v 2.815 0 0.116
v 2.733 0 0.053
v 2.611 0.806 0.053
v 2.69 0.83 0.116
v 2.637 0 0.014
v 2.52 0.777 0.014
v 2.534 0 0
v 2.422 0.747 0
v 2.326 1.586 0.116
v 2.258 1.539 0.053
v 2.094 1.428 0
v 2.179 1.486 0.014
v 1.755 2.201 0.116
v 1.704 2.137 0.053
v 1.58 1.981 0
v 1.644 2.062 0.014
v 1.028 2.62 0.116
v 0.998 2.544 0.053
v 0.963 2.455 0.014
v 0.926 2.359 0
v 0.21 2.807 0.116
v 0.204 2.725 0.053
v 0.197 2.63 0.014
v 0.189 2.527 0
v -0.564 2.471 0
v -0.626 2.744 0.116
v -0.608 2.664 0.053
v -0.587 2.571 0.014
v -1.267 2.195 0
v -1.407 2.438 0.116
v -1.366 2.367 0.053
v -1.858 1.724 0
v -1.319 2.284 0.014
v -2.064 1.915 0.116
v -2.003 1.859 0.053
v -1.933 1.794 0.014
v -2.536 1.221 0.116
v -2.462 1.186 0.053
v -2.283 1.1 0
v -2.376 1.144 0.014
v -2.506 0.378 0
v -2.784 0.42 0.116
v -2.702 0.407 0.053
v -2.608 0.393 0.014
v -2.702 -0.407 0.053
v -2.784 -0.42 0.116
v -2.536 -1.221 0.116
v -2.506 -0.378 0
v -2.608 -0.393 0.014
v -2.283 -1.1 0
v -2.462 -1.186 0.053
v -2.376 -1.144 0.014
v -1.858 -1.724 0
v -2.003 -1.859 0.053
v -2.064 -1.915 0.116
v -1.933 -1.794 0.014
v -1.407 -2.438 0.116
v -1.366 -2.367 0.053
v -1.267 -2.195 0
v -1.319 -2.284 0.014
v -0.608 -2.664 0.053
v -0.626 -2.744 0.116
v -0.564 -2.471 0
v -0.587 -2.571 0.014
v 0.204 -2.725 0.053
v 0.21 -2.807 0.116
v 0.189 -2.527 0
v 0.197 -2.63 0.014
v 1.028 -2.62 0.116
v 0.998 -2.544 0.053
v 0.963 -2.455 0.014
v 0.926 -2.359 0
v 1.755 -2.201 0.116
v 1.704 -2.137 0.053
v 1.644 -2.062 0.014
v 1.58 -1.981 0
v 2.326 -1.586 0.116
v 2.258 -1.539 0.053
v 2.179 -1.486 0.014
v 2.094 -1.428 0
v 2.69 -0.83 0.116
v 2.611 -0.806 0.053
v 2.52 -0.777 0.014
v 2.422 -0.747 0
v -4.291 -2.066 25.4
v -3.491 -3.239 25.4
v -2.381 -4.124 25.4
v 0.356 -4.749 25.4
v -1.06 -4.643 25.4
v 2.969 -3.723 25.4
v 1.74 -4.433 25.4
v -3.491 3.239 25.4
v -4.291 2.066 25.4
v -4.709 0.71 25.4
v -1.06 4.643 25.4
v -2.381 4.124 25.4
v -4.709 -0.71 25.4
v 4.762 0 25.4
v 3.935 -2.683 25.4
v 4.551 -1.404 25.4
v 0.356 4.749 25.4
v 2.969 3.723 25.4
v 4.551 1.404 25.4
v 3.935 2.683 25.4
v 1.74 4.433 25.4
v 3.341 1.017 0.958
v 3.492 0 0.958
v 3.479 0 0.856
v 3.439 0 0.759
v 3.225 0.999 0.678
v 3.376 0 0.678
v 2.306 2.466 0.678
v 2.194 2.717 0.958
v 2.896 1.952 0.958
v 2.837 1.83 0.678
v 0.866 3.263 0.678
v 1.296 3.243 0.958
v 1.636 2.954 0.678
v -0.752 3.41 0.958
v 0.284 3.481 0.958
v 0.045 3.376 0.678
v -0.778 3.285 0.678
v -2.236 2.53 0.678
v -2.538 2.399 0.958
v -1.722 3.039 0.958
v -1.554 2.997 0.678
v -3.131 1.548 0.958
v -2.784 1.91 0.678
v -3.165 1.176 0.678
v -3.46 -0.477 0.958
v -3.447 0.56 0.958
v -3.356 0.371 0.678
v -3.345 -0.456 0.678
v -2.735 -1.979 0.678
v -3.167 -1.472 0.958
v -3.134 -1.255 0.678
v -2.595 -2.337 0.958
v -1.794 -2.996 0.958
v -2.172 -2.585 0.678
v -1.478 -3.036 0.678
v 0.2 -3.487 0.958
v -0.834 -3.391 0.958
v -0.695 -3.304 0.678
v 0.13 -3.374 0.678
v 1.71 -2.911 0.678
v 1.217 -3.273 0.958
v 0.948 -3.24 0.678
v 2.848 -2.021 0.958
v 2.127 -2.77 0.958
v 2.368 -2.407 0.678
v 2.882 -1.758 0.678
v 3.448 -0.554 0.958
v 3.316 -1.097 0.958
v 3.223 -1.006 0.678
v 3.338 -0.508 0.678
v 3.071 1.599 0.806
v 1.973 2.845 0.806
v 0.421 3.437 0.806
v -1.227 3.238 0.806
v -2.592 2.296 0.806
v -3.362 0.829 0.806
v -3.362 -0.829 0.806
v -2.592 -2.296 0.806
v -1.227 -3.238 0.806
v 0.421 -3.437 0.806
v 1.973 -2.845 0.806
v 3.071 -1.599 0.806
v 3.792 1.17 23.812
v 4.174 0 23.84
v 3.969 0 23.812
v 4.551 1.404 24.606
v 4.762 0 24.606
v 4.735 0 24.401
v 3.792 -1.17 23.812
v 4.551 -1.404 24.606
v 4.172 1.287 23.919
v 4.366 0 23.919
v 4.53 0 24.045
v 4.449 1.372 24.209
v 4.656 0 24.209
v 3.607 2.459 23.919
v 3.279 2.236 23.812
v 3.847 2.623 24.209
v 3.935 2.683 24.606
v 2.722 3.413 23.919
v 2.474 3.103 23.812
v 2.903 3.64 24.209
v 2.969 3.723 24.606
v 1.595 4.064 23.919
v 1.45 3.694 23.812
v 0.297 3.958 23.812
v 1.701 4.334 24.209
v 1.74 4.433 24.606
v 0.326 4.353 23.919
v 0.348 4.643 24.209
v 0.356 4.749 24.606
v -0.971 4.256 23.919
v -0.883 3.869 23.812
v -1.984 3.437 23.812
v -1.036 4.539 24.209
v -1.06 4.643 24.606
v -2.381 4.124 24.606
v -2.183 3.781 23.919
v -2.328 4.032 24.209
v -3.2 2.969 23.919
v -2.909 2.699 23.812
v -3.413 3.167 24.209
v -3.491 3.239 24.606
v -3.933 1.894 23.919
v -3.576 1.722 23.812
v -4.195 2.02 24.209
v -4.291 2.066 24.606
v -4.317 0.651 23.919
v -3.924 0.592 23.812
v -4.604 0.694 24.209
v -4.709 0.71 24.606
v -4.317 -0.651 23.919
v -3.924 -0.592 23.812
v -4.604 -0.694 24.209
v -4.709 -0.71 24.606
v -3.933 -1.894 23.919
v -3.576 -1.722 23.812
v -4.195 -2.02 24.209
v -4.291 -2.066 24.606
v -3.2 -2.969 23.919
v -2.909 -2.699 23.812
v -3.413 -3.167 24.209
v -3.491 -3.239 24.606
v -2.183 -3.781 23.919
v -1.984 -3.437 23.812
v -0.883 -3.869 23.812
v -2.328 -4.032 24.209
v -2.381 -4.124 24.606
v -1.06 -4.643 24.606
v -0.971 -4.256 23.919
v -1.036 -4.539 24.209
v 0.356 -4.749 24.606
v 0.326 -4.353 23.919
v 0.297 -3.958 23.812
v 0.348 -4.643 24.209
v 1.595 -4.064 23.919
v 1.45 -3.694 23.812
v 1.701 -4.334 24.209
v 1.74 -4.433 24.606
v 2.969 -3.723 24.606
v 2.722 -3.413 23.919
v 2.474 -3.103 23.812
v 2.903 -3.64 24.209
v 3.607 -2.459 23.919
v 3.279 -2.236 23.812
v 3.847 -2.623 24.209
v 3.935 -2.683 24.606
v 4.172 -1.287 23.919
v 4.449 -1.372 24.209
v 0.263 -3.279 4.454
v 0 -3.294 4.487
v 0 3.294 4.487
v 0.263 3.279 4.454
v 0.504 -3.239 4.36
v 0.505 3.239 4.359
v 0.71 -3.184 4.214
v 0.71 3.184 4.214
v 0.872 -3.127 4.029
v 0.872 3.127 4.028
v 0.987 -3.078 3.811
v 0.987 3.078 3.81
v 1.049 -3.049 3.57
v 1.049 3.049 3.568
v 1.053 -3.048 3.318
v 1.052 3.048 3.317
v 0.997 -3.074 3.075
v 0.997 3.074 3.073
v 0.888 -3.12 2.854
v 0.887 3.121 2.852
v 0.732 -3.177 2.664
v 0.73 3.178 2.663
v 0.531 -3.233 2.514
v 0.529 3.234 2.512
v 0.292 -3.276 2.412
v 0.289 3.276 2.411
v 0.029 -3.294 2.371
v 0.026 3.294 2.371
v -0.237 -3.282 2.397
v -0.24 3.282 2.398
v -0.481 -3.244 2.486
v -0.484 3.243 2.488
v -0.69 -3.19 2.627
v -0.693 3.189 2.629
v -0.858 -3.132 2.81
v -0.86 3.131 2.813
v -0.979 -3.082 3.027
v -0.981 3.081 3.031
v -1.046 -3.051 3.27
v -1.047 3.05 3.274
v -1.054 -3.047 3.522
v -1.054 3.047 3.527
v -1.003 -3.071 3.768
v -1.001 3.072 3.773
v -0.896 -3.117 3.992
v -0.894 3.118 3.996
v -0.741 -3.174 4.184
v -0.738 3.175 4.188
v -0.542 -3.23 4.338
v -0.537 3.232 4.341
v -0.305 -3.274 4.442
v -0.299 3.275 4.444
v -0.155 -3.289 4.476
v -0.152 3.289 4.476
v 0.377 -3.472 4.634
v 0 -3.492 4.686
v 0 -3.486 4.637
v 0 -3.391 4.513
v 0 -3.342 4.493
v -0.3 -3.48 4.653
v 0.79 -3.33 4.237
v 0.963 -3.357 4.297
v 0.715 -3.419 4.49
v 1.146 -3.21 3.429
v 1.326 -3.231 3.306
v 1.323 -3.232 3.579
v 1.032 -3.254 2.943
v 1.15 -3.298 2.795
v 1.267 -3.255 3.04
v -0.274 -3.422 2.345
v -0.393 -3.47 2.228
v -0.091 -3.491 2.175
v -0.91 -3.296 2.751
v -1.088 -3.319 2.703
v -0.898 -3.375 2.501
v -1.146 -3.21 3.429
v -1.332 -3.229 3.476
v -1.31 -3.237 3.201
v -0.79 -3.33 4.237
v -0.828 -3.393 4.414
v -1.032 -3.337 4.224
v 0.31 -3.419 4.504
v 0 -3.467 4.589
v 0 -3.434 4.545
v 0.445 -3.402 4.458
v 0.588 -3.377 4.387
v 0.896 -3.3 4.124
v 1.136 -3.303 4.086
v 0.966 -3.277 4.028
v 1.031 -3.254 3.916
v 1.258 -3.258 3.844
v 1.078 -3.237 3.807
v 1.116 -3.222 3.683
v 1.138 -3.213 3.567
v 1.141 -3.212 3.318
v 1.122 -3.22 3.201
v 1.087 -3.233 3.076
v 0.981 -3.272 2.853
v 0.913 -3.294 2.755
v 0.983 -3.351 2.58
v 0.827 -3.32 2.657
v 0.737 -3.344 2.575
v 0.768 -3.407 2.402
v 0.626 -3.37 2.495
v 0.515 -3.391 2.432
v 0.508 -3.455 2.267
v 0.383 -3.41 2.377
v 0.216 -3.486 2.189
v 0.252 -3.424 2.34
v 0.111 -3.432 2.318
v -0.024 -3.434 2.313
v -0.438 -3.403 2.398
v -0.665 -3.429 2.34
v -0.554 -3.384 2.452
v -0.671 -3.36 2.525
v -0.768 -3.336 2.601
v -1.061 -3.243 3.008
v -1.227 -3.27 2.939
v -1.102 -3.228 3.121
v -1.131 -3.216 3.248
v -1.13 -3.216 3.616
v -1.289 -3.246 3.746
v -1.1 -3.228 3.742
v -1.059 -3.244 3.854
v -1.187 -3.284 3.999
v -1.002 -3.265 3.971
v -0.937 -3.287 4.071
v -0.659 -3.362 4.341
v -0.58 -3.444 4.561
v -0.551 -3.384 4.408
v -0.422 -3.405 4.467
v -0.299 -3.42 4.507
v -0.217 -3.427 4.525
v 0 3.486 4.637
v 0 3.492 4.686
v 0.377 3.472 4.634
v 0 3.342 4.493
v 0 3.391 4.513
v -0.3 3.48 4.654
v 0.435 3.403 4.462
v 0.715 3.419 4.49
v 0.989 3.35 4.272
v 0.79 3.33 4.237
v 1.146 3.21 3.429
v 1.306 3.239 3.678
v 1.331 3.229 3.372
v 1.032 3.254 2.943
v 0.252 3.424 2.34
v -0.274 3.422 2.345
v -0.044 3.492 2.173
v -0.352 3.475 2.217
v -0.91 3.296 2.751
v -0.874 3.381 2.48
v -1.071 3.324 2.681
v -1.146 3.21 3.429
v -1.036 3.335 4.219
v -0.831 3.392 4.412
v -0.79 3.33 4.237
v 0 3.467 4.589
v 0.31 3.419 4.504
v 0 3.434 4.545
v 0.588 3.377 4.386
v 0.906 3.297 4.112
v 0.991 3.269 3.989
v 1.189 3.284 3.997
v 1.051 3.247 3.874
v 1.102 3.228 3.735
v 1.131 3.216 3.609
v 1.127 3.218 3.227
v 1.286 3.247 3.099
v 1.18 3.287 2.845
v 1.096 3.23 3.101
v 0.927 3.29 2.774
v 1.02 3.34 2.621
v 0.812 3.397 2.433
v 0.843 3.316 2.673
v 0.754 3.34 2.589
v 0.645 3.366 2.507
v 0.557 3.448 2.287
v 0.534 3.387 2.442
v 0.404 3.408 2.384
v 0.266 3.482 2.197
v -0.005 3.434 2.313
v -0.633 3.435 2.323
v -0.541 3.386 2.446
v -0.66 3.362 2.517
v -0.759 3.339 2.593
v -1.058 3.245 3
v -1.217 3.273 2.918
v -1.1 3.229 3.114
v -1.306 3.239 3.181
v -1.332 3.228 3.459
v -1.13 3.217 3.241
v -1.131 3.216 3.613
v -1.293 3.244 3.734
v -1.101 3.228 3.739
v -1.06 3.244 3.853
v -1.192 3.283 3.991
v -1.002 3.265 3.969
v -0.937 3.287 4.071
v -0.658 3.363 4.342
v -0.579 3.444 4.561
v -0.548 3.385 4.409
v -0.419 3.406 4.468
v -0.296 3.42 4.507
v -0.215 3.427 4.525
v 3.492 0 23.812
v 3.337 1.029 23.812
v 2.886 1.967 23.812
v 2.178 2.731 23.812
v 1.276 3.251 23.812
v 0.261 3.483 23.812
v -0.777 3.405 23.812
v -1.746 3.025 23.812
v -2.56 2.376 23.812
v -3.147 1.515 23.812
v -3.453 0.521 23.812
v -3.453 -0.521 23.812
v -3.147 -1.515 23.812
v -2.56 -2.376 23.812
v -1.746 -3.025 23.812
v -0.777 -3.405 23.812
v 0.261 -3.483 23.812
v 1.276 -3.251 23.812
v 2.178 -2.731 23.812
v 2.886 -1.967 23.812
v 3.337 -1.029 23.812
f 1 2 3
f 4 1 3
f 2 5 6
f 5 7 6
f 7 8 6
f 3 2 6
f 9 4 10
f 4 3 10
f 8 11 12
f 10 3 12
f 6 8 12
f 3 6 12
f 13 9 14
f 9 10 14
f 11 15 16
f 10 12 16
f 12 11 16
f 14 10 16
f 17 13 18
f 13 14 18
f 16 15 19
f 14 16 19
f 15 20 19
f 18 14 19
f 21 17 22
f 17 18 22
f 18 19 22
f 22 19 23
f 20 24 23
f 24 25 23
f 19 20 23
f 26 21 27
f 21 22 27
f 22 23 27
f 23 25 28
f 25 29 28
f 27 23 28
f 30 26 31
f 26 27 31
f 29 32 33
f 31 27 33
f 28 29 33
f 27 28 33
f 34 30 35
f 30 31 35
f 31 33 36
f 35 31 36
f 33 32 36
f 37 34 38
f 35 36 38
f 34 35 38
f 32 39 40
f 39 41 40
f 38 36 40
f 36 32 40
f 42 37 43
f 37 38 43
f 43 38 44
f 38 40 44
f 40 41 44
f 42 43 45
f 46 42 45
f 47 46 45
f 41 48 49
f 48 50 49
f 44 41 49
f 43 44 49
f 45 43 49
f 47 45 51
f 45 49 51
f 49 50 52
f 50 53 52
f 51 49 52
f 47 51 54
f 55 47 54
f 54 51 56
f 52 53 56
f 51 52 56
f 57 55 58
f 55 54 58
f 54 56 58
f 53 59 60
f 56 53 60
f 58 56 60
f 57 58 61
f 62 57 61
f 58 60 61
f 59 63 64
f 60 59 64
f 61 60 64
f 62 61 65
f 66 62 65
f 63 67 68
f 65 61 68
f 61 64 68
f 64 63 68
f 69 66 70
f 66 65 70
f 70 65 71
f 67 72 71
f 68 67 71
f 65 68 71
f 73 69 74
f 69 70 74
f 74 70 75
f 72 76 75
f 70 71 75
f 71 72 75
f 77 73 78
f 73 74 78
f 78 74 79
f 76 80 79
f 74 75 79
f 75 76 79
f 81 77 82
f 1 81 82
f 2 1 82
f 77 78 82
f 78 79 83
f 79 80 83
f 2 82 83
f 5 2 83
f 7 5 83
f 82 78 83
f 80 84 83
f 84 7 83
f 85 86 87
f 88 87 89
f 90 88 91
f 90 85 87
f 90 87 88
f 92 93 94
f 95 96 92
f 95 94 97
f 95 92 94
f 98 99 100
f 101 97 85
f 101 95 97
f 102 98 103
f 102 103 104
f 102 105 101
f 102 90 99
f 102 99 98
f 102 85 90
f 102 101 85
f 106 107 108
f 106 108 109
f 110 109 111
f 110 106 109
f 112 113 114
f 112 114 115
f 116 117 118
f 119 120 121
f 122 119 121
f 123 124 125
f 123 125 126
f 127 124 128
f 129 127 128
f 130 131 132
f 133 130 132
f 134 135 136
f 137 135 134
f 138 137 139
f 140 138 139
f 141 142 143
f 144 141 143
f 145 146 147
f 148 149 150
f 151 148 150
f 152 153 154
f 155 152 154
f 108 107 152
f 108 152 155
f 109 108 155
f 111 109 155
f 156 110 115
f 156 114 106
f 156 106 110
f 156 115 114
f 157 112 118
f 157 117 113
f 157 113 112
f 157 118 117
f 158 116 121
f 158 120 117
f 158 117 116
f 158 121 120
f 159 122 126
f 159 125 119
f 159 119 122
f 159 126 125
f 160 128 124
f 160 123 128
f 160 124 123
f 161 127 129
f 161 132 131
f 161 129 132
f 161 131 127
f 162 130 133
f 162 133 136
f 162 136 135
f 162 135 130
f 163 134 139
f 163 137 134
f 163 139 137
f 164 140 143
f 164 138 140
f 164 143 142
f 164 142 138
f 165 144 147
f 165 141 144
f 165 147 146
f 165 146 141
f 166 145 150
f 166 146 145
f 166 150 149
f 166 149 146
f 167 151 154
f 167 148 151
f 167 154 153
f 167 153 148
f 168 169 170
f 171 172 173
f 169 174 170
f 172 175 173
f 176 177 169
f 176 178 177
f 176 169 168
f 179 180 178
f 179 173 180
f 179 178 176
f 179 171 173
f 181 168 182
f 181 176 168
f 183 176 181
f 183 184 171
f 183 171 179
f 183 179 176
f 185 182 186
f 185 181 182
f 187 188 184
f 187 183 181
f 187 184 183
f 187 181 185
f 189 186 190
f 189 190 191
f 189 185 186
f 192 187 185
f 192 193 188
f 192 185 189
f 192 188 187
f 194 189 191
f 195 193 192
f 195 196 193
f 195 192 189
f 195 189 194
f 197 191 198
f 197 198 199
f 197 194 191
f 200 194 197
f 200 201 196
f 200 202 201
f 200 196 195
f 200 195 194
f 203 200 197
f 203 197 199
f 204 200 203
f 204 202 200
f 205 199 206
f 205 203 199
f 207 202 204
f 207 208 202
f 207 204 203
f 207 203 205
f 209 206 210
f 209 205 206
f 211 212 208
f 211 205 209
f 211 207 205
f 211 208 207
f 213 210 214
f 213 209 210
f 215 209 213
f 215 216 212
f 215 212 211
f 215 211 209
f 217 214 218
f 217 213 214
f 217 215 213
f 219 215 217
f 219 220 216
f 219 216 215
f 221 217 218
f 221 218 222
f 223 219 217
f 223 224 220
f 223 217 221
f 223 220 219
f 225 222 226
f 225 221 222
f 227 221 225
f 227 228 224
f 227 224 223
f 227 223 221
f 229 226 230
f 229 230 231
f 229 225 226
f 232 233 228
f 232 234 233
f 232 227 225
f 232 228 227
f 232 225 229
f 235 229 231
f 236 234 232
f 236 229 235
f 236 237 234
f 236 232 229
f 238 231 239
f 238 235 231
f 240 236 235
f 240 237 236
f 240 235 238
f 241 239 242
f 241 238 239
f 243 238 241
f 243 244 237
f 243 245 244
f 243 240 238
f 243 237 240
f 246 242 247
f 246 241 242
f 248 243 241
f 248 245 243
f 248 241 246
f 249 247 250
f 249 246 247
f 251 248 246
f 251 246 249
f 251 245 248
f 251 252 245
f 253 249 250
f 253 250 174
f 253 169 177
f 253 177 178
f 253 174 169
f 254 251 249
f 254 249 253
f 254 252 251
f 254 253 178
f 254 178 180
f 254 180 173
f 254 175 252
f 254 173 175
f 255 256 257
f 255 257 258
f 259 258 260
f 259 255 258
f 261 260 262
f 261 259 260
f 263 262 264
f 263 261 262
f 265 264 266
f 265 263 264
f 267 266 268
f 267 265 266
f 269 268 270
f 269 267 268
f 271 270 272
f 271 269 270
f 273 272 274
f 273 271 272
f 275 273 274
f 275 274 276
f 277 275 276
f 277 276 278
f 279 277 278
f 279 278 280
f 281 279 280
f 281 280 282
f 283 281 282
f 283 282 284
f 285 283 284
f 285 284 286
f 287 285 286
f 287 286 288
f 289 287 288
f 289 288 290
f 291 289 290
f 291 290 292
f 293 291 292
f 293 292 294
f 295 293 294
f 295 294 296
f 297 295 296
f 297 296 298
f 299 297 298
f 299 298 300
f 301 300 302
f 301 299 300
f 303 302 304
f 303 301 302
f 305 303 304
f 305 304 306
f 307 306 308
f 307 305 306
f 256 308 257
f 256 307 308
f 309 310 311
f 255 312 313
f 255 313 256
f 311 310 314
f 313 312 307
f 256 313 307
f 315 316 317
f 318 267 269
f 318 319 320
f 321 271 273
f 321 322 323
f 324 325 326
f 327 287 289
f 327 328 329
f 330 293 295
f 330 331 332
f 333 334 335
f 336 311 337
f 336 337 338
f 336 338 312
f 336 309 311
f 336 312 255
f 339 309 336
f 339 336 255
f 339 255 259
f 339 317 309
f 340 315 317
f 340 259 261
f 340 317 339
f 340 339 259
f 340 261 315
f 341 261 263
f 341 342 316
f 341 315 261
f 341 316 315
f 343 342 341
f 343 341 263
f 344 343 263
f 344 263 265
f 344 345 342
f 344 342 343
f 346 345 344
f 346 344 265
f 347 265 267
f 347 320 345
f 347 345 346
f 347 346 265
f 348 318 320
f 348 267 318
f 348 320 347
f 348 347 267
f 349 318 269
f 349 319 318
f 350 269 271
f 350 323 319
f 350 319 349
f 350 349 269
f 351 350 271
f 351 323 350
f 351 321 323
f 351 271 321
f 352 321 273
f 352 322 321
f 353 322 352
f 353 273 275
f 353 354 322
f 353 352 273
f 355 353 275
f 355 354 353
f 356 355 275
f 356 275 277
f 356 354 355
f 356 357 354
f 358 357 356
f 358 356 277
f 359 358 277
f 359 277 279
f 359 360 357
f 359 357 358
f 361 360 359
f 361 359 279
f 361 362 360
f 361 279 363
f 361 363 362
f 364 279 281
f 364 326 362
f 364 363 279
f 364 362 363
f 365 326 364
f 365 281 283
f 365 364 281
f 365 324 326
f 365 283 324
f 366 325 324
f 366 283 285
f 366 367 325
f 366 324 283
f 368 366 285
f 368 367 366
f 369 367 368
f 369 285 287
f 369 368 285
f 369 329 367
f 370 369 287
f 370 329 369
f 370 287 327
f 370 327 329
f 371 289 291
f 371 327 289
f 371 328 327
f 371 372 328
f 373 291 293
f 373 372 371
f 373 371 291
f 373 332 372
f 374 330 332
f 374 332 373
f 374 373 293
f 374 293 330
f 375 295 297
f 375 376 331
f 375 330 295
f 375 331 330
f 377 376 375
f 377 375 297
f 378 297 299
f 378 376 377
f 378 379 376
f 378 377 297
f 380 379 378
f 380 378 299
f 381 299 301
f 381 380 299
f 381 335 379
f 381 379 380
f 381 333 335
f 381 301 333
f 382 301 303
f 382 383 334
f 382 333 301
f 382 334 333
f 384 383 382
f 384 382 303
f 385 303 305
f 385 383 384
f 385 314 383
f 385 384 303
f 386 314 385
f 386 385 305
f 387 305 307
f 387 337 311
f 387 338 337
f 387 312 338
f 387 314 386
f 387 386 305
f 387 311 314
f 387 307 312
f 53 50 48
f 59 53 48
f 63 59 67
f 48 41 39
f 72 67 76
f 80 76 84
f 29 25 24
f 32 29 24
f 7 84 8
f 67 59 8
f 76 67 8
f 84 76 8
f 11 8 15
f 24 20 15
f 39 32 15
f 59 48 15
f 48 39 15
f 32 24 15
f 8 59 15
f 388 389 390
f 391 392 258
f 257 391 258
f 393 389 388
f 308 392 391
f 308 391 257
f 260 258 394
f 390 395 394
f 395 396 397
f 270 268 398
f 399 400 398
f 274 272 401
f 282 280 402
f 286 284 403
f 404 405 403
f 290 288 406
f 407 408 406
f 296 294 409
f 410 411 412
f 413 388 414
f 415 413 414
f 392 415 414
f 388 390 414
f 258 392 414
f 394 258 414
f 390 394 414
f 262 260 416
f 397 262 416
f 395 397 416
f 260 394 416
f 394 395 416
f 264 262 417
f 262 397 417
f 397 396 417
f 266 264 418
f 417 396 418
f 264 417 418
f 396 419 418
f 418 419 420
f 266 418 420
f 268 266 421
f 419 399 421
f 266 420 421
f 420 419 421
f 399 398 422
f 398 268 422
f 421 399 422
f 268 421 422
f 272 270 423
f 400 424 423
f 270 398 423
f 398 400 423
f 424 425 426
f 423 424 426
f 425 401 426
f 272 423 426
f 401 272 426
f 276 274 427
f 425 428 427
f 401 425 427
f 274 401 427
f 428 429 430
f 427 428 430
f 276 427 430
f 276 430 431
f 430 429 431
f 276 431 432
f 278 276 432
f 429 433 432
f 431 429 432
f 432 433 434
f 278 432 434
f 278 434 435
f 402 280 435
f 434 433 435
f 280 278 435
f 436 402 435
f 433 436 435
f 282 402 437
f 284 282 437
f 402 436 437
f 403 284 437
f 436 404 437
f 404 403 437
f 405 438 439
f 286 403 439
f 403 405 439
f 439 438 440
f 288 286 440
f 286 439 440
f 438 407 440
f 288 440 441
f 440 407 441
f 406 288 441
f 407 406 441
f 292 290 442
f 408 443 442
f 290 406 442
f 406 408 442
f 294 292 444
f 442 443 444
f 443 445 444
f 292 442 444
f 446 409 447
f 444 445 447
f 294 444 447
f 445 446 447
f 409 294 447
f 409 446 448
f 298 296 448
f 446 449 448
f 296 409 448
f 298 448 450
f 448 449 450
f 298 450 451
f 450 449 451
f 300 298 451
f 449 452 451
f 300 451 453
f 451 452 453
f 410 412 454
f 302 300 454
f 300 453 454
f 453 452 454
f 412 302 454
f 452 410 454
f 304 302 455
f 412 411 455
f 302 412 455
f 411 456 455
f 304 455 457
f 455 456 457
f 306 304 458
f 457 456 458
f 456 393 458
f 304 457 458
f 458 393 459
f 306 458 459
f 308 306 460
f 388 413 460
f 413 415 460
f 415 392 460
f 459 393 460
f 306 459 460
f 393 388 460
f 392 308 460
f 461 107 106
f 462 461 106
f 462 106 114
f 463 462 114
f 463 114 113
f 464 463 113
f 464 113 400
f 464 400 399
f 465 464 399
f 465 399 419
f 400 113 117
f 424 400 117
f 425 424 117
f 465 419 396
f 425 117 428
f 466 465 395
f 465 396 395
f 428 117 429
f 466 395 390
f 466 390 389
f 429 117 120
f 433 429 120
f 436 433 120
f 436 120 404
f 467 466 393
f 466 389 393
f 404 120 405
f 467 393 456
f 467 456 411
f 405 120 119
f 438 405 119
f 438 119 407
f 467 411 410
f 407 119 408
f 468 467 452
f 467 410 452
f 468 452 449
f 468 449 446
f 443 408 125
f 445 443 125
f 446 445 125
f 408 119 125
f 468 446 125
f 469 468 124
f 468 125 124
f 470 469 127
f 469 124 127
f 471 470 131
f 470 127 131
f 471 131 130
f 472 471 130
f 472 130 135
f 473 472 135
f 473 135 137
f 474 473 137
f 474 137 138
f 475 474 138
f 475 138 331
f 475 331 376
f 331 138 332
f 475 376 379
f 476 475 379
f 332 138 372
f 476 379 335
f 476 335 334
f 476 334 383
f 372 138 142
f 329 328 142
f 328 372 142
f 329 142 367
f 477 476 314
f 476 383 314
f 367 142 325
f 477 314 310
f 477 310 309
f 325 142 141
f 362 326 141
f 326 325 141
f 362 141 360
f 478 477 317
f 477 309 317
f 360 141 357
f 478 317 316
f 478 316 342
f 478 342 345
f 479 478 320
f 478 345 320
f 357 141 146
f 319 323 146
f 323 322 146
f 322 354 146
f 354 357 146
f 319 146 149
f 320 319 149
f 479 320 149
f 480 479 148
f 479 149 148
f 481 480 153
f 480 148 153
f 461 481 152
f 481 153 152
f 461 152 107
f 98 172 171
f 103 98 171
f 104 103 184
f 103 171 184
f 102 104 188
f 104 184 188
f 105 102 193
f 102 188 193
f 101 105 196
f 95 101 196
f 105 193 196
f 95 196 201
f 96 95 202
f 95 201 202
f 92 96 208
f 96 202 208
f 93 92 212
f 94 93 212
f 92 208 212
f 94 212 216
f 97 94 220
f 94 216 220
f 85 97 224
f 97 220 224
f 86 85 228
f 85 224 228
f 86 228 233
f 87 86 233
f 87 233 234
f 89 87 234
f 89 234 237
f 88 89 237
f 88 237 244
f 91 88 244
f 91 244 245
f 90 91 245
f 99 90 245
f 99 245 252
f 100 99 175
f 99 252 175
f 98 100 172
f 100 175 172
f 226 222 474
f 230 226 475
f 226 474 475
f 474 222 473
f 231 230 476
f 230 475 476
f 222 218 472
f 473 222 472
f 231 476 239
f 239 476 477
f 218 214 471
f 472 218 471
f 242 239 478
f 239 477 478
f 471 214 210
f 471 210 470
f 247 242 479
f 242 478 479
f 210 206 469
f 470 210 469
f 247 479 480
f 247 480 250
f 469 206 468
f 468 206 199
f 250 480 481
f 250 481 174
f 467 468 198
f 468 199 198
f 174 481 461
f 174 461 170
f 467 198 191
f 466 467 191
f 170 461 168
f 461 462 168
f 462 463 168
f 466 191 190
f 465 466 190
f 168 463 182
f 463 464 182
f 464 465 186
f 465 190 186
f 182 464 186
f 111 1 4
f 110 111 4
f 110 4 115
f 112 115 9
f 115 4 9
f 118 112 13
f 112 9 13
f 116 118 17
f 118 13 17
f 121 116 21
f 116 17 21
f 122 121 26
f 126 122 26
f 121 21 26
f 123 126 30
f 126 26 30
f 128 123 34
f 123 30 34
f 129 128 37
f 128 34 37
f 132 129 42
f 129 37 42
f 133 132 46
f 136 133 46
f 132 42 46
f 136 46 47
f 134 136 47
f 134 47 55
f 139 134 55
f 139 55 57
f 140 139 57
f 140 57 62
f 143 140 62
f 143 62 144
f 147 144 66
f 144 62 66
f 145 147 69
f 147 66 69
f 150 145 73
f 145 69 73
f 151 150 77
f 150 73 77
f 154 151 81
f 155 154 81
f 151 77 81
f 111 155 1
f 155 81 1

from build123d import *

# Parameters (mm, degrees)
SKETCH1_R               = 3.4925
BOSS_EXTRUDE1_DEPTH     = 23.8125
SKETCH2_R               = 4.7625
BOSS_EXTRUDE2_DEPTH     = 1.5875
CUT_EXTRUDE1_DEPTH      = 27.277800755
CUT_EXTRUDE1_DEPTH_BACK = 27.277800755
SKETCH3_R               = 1.058333333
FILLET1_R               = 0.1984375
FILLET3_R               = 0.79375
CHAMFER1_SIZE           = 0.79375
FILLET4_R               = 0.396875


with BuildPart() as part:
    # Sketch1 → Boss-Extrude1 (new body)
    with BuildSketch(Plane.XY):
        Circle(SKETCH1_R)
    extrude(amount=BOSS_EXTRUDE1_DEPTH)

    # Sketch2 → Boss-Extrude2 (add)
    with BuildSketch(Plane.XY.offset(23.8125)):
        Circle(SKETCH2_R)
    extrude(amount=BOSS_EXTRUDE2_DEPTH)

    # Sketch3 → Cut-Extrude1 (cut, two sides: drawn at the far end of the back side and taken through both)
    with BuildSketch(Plane(origin=(0, 0, 0), x_dir=(1, 0, 0), z_dir=(0, 1, 0)).offset(-CUT_EXTRUDE1_DEPTH_BACK)):
        with Locations(Location((0, -3.429, 0), (0, 0, 270))):
            Circle(SKETCH3_R)
    extrude(amount=CUT_EXTRUDE1_DEPTH + CUT_EXTRUDE1_DEPTH_BACK, mode=Mode.SUBTRACT)

    # Fillet1
    fillet1_edges = [part.edges().sort_by_distance(p)[0] for p in [
        (0, 3.492500015, 2.370666678),
        (0, -3.492500015, 2.370666678),
    ]]
    fillet(fillet1_edges, radius=FILLET1_R)

    # Fillet3
    fillet3_edges = [part.edges().sort_by_distance(p)[0] for p in [
        (-4.7625, 0, 23.8125),
    ]]
    fillet(fillet3_edges, radius=FILLET3_R)

    # Chamfer1
    chamfer1_edges = [part.edges().sort_by_distance(p)[0] for p in [
        (-3.4925, 0, 0),
    ]]
    chamfer(chamfer1_edges, length=CHAMFER1_SIZE)

    # Fillet4
    fillet4_edges = [part.edges().sort_by_distance(p)[0] for p in [
        (-3.4925, 0, 0.79375),
        (-2.69875, 0, 0),
    ]]
    fillet(fillet4_edges, radius=FILLET4_R)


solid = part.part
